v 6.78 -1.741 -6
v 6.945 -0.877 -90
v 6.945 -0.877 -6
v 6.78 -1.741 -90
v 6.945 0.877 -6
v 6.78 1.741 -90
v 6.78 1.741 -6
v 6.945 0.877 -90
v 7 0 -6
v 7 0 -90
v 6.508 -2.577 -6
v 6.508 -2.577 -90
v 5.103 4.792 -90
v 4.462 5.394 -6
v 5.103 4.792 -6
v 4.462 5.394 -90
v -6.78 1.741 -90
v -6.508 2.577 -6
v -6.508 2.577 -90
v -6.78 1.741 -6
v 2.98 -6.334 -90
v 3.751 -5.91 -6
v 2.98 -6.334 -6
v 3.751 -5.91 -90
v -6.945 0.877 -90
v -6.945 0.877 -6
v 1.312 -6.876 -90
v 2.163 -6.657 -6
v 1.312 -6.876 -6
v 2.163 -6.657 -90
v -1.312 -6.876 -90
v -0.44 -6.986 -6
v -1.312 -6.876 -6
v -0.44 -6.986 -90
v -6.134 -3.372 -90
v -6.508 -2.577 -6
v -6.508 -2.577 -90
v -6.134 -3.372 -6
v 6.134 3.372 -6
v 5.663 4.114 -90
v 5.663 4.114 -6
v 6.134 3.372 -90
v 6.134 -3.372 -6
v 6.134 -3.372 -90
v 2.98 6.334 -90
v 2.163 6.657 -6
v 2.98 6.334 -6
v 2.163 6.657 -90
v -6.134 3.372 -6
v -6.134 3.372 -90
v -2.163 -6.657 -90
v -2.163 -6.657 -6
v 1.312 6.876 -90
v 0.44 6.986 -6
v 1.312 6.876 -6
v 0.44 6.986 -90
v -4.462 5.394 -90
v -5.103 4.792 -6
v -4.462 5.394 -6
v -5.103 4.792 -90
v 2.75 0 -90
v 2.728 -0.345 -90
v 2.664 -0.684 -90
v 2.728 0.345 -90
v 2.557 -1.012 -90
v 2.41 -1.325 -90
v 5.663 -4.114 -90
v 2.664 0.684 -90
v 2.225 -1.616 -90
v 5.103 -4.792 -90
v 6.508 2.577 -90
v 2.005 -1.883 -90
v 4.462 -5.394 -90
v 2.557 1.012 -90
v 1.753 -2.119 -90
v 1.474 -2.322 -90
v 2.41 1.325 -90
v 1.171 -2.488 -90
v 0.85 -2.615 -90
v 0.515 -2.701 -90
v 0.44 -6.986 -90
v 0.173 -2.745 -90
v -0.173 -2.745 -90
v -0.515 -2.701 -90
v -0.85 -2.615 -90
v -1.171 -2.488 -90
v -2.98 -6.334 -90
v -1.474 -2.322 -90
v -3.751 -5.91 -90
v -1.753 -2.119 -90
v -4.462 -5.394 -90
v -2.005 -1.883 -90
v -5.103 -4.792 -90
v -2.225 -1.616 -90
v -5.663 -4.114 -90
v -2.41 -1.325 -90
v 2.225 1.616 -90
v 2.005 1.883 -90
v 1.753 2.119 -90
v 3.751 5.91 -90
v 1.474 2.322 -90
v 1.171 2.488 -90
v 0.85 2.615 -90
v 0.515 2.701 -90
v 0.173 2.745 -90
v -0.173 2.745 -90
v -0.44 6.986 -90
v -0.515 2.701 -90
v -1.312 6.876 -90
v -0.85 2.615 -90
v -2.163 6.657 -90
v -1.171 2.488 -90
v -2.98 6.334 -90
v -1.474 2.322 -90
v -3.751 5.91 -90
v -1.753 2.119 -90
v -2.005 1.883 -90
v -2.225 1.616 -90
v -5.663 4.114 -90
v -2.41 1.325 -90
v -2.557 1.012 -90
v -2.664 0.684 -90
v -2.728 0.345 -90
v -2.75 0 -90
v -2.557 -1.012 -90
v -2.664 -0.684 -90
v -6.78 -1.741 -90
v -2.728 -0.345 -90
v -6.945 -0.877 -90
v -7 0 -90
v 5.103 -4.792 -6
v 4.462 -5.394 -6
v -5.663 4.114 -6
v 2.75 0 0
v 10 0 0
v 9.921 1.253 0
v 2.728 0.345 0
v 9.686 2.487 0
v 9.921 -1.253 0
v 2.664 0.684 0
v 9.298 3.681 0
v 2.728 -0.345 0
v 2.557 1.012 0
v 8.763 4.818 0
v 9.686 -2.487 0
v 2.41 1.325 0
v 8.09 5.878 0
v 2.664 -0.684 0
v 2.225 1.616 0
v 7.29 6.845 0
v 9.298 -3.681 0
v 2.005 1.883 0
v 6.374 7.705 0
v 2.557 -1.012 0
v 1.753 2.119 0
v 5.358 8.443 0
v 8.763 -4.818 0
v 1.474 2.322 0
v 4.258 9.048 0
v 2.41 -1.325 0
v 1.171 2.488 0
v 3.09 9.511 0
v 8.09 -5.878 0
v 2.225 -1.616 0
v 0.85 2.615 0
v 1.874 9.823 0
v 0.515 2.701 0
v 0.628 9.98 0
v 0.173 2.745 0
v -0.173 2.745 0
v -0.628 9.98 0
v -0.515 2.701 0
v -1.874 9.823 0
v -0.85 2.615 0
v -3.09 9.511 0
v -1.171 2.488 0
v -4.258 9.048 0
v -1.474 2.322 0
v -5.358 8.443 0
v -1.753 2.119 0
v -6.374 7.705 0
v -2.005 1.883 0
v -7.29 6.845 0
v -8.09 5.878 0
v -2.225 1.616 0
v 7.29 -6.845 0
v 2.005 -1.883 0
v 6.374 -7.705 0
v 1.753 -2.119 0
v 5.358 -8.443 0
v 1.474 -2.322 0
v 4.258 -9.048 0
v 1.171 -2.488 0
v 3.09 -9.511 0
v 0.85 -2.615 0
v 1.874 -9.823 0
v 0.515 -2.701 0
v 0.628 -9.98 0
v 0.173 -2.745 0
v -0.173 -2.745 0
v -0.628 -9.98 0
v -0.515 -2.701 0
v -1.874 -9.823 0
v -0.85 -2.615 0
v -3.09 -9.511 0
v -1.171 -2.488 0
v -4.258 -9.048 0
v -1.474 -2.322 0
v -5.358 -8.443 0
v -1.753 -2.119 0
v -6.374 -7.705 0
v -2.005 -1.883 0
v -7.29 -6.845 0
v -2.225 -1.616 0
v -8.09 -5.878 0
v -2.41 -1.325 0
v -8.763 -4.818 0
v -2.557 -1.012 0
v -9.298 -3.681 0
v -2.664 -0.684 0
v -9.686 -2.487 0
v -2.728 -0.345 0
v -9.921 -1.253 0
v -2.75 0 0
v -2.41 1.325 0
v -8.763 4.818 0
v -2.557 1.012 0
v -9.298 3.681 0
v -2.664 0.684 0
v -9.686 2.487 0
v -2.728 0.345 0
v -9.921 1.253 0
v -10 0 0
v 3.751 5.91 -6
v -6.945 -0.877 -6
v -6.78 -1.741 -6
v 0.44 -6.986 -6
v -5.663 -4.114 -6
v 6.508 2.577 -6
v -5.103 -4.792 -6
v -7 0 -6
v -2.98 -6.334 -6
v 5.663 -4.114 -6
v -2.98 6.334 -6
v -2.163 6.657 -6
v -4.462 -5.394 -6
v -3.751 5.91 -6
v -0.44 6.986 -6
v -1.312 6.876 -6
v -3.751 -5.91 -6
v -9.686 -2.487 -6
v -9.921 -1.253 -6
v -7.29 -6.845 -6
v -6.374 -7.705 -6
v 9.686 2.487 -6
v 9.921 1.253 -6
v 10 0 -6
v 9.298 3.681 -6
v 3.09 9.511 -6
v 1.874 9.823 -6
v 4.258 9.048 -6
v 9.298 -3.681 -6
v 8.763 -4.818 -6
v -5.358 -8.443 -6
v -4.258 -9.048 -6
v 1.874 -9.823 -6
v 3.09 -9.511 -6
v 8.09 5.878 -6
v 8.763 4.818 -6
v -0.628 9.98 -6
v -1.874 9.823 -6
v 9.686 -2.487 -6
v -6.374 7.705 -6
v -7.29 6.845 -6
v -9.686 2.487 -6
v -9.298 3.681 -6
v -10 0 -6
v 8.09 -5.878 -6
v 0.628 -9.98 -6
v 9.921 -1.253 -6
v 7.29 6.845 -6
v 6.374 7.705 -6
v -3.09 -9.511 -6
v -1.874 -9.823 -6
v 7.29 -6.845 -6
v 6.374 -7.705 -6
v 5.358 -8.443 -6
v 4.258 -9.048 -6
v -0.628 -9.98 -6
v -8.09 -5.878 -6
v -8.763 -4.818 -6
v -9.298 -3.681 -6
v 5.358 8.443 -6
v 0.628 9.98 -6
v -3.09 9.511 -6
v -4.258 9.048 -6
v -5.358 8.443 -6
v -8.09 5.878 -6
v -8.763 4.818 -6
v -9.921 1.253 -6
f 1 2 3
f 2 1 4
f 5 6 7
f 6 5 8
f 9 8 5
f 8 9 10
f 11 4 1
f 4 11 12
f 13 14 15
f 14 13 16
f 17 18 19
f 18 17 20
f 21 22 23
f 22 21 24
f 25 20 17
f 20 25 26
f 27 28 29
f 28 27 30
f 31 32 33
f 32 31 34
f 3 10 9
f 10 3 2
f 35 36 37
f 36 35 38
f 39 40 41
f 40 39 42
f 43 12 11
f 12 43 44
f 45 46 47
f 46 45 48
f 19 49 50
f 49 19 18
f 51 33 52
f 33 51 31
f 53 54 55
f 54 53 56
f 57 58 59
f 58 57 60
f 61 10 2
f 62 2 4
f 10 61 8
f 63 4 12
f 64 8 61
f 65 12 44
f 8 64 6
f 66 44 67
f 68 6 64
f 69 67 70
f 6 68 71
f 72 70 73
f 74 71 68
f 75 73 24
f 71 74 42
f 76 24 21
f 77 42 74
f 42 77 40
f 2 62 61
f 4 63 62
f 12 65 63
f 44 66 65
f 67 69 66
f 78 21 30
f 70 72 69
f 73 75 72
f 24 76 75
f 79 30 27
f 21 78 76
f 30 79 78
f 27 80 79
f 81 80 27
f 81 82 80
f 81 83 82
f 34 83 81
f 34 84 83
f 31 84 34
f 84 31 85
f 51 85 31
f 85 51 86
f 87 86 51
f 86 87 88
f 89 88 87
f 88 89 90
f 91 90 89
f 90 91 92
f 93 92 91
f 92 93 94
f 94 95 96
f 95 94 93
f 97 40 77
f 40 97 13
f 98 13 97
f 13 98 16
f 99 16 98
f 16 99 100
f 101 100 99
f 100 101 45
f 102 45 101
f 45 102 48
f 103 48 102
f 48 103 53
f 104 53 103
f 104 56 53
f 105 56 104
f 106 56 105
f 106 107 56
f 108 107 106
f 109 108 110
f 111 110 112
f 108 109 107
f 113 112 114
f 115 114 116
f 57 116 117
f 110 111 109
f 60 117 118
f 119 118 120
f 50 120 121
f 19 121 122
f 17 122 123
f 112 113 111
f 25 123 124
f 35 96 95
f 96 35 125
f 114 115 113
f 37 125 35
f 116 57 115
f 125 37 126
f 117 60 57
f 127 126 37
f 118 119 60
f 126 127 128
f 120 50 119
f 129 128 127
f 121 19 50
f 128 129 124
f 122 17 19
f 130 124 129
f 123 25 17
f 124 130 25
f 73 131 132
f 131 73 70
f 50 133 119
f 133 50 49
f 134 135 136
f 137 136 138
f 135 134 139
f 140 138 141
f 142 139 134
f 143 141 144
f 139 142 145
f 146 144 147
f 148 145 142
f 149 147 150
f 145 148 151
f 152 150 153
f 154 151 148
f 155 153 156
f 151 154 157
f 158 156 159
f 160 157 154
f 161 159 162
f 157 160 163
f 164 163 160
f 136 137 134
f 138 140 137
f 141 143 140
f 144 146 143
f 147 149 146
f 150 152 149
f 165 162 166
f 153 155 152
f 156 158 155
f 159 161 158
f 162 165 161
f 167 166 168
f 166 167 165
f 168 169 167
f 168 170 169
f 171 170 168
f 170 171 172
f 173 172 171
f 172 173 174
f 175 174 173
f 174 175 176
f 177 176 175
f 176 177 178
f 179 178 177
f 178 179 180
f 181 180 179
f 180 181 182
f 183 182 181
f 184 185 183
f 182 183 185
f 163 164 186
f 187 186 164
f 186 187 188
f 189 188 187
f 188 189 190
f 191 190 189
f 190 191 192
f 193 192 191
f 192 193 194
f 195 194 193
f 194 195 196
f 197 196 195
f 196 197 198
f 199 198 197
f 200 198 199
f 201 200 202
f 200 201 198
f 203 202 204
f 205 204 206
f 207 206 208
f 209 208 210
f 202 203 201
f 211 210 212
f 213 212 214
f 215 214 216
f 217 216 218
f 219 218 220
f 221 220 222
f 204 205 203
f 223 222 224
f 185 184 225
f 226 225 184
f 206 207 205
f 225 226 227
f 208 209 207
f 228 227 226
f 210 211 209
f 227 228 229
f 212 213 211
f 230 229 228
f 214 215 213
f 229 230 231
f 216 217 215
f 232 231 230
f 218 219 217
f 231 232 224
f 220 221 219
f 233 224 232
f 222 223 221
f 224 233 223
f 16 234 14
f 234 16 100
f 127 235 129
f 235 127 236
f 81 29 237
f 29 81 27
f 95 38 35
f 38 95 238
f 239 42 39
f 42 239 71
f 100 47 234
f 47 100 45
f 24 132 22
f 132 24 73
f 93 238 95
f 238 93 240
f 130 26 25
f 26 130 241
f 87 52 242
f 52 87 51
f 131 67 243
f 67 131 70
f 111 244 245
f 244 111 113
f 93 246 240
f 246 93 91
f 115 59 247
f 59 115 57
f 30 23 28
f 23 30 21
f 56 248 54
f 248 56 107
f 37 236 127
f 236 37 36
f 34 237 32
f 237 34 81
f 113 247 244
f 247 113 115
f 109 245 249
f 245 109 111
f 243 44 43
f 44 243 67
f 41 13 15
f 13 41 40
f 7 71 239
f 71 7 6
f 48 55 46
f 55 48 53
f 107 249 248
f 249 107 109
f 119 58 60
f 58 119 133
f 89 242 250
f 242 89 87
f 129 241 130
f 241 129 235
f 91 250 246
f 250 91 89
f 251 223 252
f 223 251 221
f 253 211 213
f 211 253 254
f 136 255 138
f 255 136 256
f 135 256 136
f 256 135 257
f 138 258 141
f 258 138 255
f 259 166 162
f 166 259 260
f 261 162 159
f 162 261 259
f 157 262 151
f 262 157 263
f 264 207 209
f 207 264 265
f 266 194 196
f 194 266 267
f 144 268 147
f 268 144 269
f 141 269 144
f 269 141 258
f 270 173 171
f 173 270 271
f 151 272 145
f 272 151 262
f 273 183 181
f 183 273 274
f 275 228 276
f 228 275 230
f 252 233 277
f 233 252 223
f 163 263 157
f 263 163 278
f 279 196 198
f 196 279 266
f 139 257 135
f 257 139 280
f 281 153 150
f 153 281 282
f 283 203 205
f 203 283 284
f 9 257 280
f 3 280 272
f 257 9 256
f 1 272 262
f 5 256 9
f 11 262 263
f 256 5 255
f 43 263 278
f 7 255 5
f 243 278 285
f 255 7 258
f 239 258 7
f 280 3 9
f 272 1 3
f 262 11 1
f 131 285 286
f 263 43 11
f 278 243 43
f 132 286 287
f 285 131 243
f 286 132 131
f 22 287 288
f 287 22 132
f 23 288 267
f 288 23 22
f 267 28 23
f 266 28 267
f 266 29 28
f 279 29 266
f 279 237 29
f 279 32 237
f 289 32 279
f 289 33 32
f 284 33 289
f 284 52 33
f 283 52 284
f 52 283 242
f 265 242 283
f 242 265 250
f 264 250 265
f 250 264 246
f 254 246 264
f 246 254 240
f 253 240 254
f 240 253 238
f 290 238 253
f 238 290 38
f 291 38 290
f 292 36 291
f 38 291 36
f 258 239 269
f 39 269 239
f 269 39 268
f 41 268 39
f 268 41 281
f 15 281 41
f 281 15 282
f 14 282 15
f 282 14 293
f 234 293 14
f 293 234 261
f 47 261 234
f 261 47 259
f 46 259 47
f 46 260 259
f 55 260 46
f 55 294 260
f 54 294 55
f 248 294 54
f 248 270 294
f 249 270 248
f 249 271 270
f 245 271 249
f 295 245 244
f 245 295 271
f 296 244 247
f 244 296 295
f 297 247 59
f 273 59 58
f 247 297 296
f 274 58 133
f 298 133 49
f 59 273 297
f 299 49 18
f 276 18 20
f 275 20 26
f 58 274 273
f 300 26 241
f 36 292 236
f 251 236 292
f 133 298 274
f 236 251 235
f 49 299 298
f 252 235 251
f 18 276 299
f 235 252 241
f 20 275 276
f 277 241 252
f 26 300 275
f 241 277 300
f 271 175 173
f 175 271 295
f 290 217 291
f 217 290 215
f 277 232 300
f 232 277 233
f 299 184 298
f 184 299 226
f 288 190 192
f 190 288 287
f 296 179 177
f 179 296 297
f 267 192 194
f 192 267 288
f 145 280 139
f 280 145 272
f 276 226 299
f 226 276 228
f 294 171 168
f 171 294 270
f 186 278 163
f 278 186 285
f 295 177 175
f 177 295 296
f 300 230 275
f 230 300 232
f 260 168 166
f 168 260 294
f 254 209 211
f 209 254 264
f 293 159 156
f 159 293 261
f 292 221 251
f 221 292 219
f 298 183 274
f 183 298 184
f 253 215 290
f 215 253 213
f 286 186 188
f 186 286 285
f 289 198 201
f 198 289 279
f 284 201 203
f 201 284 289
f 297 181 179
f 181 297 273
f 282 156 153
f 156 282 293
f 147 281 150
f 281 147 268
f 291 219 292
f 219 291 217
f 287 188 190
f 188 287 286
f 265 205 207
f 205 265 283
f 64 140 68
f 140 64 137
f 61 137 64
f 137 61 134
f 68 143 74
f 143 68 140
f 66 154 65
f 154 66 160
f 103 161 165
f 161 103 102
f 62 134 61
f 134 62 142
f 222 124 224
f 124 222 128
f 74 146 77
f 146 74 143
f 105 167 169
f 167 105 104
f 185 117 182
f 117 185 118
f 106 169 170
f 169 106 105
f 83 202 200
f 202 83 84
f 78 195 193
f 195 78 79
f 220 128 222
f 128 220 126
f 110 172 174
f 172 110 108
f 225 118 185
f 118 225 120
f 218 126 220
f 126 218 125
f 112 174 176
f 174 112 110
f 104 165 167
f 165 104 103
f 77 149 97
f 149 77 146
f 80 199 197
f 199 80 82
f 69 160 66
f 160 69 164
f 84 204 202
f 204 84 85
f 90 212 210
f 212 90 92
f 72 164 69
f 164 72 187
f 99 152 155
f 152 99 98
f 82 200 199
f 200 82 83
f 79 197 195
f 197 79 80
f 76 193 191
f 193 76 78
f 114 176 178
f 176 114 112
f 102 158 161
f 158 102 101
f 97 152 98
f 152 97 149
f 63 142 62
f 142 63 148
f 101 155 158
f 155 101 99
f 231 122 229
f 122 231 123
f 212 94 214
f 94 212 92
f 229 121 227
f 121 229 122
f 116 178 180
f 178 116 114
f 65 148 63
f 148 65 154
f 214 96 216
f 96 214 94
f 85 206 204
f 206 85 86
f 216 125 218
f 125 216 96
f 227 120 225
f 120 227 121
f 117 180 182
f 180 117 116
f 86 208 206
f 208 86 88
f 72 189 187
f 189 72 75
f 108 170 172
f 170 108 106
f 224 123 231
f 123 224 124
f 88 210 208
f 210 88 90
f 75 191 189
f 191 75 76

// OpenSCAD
$fn = 50;


difference() {
	union() {
		translate(v = [0, 0, -90.0000000000]) {
			cylinder(h = 90, r = 7.0000000000);
		}
		translate(v = [0, 0, -6.0000000000]) {
			cylinder(h = 6, r = 10.0000000000);
		}
	}
	union() {
		#translate(v = [0, 0, -90]) {
			cylinder(h = 90, r = 2.7500000000);
		}
	}
}
